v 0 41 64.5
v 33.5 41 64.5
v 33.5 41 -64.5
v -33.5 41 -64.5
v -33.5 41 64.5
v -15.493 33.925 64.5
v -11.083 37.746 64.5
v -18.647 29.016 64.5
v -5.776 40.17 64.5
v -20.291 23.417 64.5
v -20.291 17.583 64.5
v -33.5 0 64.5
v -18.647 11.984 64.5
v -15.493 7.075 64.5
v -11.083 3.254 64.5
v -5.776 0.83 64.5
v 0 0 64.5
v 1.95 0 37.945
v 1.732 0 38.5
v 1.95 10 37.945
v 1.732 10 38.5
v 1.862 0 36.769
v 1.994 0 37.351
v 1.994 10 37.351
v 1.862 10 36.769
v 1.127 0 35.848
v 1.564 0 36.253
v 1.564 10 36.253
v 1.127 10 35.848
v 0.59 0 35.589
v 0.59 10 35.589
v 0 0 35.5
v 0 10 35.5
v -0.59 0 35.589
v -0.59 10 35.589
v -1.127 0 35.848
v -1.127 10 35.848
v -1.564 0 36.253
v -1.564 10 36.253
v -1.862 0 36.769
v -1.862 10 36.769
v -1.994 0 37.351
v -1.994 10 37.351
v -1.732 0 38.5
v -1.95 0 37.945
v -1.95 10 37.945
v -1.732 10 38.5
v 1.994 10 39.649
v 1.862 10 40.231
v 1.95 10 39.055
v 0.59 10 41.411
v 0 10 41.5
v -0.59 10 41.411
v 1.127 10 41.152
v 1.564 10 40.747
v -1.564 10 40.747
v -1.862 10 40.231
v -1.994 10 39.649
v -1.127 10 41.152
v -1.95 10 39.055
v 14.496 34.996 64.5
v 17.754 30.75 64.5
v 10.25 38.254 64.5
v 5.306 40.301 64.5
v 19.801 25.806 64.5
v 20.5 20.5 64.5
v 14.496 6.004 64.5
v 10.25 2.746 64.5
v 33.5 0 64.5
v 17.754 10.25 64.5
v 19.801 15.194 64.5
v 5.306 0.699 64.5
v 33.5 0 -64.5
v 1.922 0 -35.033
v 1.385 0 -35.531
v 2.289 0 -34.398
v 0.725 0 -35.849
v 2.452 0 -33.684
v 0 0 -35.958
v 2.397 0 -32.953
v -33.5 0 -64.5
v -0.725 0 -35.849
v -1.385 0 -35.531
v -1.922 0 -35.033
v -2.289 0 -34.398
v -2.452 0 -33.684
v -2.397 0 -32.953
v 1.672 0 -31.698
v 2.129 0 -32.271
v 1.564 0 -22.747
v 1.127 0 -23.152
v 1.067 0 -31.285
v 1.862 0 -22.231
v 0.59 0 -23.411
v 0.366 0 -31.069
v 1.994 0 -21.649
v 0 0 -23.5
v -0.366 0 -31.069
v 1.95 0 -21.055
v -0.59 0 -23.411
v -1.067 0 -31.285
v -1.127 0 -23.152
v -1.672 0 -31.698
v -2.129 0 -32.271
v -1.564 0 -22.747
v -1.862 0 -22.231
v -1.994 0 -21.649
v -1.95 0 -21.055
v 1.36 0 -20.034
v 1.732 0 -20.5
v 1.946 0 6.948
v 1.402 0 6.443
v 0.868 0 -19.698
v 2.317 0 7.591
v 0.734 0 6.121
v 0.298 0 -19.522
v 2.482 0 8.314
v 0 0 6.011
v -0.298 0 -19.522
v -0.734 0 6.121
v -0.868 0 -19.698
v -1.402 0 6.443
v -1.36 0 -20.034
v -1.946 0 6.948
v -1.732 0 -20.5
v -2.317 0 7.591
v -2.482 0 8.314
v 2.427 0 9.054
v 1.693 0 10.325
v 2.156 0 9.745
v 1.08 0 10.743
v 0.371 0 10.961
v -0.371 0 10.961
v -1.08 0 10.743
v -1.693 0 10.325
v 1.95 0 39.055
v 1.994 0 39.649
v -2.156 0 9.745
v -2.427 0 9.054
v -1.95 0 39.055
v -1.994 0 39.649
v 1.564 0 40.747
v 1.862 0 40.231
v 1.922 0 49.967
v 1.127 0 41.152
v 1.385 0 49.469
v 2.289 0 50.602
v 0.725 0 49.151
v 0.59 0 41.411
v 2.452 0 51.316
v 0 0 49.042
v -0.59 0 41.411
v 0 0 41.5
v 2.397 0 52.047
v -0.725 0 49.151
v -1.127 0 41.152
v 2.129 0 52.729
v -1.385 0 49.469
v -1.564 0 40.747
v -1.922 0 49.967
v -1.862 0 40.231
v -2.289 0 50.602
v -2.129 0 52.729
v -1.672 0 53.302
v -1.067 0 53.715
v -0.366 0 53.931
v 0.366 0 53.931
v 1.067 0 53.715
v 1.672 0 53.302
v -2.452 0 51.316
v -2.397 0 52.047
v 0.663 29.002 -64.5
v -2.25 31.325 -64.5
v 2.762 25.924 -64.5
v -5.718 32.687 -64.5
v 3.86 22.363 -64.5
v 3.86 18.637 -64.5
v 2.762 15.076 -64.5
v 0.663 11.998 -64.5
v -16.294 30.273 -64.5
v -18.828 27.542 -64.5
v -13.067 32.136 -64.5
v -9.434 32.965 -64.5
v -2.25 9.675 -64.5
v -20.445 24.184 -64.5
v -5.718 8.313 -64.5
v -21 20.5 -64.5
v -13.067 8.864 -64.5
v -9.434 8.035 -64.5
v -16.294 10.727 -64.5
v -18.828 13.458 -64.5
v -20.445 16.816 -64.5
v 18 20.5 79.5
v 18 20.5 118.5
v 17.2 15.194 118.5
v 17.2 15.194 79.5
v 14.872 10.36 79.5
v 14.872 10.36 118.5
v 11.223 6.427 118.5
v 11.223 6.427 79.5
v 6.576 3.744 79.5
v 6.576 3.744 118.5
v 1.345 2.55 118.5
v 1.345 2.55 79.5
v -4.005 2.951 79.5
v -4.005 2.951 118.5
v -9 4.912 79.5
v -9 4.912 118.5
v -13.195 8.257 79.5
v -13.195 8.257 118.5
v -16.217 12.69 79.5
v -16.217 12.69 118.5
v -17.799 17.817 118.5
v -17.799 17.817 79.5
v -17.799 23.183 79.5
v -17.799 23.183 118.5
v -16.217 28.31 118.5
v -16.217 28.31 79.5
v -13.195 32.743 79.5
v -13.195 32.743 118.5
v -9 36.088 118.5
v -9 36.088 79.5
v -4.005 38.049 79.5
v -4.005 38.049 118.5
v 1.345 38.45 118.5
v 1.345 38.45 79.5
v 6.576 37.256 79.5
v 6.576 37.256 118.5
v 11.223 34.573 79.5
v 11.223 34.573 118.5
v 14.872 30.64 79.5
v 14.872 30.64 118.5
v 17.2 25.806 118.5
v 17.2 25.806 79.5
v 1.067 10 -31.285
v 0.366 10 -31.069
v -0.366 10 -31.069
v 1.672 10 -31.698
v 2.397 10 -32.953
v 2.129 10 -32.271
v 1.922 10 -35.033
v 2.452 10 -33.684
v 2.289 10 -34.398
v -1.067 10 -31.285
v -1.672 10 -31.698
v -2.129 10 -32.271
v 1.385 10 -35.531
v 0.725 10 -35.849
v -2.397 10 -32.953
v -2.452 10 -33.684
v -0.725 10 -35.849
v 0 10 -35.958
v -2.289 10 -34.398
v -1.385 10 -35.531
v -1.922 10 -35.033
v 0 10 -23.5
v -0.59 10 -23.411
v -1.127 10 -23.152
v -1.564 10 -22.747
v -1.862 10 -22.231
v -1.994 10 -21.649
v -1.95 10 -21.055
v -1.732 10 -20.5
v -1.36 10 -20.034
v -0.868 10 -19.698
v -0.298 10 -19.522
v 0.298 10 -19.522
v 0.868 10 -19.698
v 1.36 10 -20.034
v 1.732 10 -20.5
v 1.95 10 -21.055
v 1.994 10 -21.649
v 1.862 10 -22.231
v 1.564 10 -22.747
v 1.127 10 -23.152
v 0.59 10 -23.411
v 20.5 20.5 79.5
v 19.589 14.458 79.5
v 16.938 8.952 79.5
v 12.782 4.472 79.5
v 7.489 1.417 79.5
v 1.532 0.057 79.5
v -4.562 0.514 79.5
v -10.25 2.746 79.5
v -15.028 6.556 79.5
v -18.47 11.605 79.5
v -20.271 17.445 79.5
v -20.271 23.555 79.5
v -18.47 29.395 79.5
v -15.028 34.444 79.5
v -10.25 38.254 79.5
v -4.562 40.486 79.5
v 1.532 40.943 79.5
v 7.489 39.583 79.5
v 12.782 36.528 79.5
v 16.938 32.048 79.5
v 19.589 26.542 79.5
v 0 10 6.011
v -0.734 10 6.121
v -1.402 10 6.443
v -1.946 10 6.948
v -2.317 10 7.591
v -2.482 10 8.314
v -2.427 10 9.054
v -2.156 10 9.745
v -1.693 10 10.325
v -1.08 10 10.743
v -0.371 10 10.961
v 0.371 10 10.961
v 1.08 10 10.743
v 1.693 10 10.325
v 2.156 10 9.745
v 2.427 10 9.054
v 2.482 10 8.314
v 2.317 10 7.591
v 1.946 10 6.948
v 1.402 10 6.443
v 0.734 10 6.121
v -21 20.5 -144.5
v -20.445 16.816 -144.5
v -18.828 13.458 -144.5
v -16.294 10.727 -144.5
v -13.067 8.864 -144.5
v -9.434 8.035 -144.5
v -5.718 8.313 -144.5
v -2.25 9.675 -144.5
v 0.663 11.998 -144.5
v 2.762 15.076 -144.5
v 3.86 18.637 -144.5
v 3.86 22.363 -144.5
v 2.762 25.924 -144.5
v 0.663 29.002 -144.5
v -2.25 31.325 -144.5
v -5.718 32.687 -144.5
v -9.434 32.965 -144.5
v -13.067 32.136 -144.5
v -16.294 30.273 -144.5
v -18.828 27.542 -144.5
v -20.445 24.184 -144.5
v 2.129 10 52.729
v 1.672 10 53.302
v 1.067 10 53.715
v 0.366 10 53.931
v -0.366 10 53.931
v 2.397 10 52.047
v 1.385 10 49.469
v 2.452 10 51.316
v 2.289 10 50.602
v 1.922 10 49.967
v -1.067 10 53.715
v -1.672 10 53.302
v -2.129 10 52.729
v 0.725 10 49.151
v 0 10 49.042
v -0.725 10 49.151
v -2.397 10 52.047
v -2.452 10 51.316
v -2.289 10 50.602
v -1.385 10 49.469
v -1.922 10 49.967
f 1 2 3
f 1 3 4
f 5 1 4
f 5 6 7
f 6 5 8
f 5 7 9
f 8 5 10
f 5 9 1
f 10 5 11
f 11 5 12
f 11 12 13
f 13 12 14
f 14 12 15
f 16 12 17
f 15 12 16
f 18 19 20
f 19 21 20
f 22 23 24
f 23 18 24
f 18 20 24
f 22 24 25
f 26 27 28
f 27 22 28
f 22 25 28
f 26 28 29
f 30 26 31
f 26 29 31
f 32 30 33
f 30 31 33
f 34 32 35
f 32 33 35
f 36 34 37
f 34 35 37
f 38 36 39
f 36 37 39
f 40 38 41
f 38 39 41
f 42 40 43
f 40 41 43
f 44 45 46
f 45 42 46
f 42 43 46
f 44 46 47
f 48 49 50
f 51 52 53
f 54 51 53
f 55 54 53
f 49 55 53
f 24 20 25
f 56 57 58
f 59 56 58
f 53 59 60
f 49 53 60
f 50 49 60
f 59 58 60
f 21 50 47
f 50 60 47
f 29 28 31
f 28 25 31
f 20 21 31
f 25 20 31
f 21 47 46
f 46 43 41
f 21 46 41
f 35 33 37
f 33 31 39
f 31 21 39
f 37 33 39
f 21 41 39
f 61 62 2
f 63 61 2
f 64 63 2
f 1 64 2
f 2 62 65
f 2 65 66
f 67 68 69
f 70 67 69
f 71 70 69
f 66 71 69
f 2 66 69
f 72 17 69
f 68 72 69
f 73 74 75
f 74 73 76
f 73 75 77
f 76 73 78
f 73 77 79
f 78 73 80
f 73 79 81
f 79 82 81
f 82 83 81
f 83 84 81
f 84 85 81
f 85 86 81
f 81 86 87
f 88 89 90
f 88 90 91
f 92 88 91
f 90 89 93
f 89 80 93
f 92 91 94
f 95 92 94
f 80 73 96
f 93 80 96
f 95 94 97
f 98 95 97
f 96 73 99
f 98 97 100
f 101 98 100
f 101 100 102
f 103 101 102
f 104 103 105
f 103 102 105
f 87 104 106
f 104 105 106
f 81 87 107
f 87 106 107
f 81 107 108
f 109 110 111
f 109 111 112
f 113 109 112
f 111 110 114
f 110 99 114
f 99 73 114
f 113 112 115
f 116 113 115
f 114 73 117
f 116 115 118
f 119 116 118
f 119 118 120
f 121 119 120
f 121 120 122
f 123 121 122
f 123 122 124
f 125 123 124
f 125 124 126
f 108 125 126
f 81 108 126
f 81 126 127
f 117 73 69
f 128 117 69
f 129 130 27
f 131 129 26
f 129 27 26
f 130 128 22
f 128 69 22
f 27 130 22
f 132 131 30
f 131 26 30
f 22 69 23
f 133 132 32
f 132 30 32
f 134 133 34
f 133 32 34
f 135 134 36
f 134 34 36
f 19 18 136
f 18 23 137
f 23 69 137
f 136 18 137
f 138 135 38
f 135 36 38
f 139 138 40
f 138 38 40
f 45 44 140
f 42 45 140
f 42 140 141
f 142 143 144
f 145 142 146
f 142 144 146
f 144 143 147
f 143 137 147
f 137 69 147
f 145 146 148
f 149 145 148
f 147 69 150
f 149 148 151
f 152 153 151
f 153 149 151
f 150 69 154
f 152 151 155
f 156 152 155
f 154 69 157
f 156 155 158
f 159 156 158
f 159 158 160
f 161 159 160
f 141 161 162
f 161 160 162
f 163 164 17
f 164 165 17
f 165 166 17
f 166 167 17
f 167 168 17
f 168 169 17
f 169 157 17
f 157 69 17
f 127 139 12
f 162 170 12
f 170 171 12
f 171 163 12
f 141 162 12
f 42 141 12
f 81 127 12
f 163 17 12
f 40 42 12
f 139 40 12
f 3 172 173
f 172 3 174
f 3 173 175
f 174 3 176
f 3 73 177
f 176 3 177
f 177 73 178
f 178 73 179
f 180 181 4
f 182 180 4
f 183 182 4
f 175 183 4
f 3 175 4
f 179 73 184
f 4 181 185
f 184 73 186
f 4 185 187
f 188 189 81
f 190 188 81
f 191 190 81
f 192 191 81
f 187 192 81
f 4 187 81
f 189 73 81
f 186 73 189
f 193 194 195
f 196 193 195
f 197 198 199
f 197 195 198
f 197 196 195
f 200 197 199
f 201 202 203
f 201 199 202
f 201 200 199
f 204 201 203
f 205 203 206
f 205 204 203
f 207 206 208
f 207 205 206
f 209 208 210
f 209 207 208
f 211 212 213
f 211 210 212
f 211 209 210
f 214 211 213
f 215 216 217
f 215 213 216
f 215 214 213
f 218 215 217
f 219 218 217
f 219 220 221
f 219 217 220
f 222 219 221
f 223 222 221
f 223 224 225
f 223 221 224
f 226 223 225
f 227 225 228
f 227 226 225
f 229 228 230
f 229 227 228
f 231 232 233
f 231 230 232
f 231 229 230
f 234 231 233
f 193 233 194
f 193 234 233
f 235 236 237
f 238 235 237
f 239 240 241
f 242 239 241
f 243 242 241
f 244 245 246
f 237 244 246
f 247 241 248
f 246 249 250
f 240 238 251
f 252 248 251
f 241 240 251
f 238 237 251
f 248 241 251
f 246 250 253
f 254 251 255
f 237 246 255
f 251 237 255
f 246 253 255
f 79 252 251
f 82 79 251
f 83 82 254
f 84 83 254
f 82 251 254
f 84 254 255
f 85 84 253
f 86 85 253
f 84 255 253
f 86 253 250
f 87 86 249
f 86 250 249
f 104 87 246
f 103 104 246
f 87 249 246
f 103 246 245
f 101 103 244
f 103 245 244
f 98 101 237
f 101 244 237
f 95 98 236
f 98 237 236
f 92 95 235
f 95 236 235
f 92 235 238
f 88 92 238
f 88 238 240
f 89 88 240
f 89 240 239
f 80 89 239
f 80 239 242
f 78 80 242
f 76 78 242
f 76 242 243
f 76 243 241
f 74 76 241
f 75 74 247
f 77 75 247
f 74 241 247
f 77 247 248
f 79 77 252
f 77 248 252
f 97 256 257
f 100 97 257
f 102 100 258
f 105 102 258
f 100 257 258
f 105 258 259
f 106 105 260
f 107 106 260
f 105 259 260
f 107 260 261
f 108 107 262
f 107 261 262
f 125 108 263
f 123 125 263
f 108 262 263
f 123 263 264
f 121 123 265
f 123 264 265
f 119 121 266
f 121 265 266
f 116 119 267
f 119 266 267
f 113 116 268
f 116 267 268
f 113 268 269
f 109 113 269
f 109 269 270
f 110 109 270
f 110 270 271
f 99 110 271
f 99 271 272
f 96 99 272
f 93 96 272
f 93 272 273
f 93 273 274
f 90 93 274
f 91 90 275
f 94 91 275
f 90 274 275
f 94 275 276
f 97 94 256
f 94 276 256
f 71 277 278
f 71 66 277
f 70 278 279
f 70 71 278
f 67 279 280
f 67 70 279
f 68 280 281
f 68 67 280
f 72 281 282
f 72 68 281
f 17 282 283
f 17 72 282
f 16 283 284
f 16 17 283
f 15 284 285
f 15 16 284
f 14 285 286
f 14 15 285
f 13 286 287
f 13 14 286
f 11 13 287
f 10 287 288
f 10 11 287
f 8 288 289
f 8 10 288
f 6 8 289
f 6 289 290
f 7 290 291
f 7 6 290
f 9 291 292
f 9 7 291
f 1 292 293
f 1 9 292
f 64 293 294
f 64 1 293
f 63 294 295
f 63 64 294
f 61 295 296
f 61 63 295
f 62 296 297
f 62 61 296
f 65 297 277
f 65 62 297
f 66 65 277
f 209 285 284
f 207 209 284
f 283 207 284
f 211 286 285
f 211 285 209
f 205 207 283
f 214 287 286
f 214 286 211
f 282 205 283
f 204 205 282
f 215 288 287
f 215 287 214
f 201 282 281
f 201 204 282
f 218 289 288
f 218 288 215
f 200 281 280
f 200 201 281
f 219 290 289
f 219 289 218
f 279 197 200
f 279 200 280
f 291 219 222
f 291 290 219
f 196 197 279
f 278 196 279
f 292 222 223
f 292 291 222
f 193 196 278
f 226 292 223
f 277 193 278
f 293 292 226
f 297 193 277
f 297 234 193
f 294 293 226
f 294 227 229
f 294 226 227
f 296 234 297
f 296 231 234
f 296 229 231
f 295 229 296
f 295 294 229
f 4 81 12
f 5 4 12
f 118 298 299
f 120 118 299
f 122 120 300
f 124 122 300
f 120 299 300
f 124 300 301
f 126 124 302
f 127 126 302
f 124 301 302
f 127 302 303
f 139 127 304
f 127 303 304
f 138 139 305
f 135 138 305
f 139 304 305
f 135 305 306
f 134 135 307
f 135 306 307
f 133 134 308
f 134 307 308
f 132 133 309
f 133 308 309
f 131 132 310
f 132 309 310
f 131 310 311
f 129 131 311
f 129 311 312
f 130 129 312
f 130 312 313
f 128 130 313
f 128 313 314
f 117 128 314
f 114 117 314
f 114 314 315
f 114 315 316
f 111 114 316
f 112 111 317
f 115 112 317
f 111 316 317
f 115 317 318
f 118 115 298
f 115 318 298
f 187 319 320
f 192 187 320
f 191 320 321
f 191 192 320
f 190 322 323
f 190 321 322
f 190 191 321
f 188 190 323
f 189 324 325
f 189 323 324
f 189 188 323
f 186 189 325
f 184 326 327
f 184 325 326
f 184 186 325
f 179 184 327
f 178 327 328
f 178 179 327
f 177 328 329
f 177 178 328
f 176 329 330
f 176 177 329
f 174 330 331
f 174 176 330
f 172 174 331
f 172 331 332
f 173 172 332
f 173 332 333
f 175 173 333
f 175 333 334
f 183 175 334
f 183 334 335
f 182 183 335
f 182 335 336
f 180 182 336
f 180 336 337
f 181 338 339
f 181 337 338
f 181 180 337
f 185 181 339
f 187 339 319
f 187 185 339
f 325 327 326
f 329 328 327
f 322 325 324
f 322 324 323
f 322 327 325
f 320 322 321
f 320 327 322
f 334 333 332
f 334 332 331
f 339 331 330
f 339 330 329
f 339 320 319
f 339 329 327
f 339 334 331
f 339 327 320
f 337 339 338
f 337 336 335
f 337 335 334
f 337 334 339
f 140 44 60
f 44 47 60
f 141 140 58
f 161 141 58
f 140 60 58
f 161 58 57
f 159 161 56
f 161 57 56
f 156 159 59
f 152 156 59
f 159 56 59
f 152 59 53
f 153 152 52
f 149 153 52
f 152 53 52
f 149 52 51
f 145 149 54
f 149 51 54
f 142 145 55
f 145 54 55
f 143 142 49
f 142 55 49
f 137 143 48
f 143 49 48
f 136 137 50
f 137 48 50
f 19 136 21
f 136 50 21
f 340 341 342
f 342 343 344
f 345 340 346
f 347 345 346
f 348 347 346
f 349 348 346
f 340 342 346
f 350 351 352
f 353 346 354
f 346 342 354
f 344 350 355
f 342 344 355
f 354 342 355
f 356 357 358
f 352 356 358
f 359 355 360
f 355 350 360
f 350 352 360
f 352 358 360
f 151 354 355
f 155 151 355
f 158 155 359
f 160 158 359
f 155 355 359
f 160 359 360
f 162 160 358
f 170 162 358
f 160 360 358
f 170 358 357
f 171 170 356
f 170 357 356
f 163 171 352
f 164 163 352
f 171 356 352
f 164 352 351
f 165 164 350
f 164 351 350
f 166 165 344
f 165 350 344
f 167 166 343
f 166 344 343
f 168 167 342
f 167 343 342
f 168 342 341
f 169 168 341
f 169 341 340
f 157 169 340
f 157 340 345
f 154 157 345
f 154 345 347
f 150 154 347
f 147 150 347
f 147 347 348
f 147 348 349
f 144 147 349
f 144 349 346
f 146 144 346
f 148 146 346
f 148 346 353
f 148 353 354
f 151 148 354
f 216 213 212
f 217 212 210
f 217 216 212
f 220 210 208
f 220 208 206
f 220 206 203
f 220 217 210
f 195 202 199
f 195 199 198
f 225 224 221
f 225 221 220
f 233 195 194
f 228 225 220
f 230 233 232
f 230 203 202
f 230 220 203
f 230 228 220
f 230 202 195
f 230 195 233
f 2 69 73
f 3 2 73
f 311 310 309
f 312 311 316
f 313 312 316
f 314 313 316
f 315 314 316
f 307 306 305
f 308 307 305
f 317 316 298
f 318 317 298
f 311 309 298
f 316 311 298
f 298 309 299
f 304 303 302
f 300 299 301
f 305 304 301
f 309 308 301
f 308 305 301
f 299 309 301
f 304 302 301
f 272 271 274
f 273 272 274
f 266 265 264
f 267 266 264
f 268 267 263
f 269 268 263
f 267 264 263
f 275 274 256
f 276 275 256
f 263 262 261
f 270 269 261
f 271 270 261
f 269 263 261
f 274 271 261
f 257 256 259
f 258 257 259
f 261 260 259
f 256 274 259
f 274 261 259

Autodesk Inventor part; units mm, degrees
ref_plane "YZ Plane" through (0, 0, 0) normal (1, 0, 0) x (0, 1, 0)
ref_plane "XZ Plane" through (0, 0, 0) normal (0, 1, 0) x (-1, 0, 0)
ref_plane "XY Plane" through (0, 0, 0) normal (0, 0, 1) x (1, 0, 0)
sketch "Sketch1" plane through (0, 0, 0) normal (0, 1, 0) x (-1, 0, 0)
  line L0 (33.5, 64.5) -> (-33.5, 64.5)
  line L1 (-33.5, 64.5) -> (-33.5, -64.5)
  line L2 (-33.5, -64.5) -> (33.5, -64.5)
  line L3 (33.5, -64.5) -> (33.5, 64.5)
  line L4 (33.5, 64.5) -> (-33.5, -64.5) construction
  line L5 (-33.5, 64.5) -> (33.5, -64.5) construction
  point P0 (0, 0)
  dimension "d0" = 67
  dimension "d1" = 129
extrude "Extrusion1" add sketch "Sketch1" along normal blind 41
sketch "Sketch2" plane through (-33.5, 0, 64.5) normal (0, 0, 1) x (1, 0, 0)
  circle A0 centre (33.5, 20.5) radius 20.5
  circle A1 centre (33.5, 20.5) radius 18
  point P0 (33.5, 0)
  dimension "d4" = 41
  dimension "d5" = 36
extrude "Extrusion2" add sketch "Sketch2" along normal blind 54 contours A1
extrude "Extrusion3" add sketch "Sketch2" along normal blind 15
sketch "Sketch4" plane through (33.5, 0, -64.5) normal (0, 0, -1) x (-1, 0, 0)
  circle A0 centre (42, 20.5) radius 12.5
  line L0 (67, 0) -> (67, 41) projected
  point P0 (33.5, 0)
  dimension "d13" = 25
  dimension "d14" = 25
extrude "Extrusion5" add sketch "Sketch4" along normal blind 80
sketch "Sketch5" plane through (0, 0, 0) normal (0, -1, 0) x (1, 0, 0)
  circle A0 centre (0, 51.5) radius 2.5
  circle A1 centre (0, 8.5) radius 2.5
  circle A2 centre (0, -21.5) radius 2
  circle A3 centre (0, -33.5) radius 2.5
  line L0 (-2, 39.5) -> (-2, 37.5)
  line L1 (2, 37.5) -> (2, 39.5)
  arc A4 (2, 39.5) -> (-2, 39.5) centre (0, 39.5) ccw
  arc A5 (-2, 37.5) -> (2, 37.5) centre (0, 37.5) ccw
  line L2 (18, 118.5) -> (-18, 118.5) projected
  point P0 (2, 38.5)
  point P1 (-2, 38.5)
  dimension "d17" = 5
  dimension "d19" = 4
  dimension "d20" = 5
  dimension "d23" = 67
  dimension "d24" = 80
  dimension "d25" = 110
  dimension "d35" = 85
  dimension "d36" = 60
hole "Hole1" at (0, 0, 51.5) at (0, 0, -33.5) direction (0, 1, 0) diameter 4.917 depth 10 thread size "M6x1" class "6H" standard "ANSI Metric M Profile"
hole "Hole2" at (0, 0, 8.5) direction (0, 1, 0) diameter 4.9784 depth 10 thread size "1/4-20 UNC" class "2B" standard "ANSI Unified Screw Threads"
hole "Hole3" at (0, 0, 39.5) at (0, 0, 37.5) at (0, 0, -21.5) direction (0, 1, 0) diameter 4 depth 10
properties part number "Updated Laser Scanner"
